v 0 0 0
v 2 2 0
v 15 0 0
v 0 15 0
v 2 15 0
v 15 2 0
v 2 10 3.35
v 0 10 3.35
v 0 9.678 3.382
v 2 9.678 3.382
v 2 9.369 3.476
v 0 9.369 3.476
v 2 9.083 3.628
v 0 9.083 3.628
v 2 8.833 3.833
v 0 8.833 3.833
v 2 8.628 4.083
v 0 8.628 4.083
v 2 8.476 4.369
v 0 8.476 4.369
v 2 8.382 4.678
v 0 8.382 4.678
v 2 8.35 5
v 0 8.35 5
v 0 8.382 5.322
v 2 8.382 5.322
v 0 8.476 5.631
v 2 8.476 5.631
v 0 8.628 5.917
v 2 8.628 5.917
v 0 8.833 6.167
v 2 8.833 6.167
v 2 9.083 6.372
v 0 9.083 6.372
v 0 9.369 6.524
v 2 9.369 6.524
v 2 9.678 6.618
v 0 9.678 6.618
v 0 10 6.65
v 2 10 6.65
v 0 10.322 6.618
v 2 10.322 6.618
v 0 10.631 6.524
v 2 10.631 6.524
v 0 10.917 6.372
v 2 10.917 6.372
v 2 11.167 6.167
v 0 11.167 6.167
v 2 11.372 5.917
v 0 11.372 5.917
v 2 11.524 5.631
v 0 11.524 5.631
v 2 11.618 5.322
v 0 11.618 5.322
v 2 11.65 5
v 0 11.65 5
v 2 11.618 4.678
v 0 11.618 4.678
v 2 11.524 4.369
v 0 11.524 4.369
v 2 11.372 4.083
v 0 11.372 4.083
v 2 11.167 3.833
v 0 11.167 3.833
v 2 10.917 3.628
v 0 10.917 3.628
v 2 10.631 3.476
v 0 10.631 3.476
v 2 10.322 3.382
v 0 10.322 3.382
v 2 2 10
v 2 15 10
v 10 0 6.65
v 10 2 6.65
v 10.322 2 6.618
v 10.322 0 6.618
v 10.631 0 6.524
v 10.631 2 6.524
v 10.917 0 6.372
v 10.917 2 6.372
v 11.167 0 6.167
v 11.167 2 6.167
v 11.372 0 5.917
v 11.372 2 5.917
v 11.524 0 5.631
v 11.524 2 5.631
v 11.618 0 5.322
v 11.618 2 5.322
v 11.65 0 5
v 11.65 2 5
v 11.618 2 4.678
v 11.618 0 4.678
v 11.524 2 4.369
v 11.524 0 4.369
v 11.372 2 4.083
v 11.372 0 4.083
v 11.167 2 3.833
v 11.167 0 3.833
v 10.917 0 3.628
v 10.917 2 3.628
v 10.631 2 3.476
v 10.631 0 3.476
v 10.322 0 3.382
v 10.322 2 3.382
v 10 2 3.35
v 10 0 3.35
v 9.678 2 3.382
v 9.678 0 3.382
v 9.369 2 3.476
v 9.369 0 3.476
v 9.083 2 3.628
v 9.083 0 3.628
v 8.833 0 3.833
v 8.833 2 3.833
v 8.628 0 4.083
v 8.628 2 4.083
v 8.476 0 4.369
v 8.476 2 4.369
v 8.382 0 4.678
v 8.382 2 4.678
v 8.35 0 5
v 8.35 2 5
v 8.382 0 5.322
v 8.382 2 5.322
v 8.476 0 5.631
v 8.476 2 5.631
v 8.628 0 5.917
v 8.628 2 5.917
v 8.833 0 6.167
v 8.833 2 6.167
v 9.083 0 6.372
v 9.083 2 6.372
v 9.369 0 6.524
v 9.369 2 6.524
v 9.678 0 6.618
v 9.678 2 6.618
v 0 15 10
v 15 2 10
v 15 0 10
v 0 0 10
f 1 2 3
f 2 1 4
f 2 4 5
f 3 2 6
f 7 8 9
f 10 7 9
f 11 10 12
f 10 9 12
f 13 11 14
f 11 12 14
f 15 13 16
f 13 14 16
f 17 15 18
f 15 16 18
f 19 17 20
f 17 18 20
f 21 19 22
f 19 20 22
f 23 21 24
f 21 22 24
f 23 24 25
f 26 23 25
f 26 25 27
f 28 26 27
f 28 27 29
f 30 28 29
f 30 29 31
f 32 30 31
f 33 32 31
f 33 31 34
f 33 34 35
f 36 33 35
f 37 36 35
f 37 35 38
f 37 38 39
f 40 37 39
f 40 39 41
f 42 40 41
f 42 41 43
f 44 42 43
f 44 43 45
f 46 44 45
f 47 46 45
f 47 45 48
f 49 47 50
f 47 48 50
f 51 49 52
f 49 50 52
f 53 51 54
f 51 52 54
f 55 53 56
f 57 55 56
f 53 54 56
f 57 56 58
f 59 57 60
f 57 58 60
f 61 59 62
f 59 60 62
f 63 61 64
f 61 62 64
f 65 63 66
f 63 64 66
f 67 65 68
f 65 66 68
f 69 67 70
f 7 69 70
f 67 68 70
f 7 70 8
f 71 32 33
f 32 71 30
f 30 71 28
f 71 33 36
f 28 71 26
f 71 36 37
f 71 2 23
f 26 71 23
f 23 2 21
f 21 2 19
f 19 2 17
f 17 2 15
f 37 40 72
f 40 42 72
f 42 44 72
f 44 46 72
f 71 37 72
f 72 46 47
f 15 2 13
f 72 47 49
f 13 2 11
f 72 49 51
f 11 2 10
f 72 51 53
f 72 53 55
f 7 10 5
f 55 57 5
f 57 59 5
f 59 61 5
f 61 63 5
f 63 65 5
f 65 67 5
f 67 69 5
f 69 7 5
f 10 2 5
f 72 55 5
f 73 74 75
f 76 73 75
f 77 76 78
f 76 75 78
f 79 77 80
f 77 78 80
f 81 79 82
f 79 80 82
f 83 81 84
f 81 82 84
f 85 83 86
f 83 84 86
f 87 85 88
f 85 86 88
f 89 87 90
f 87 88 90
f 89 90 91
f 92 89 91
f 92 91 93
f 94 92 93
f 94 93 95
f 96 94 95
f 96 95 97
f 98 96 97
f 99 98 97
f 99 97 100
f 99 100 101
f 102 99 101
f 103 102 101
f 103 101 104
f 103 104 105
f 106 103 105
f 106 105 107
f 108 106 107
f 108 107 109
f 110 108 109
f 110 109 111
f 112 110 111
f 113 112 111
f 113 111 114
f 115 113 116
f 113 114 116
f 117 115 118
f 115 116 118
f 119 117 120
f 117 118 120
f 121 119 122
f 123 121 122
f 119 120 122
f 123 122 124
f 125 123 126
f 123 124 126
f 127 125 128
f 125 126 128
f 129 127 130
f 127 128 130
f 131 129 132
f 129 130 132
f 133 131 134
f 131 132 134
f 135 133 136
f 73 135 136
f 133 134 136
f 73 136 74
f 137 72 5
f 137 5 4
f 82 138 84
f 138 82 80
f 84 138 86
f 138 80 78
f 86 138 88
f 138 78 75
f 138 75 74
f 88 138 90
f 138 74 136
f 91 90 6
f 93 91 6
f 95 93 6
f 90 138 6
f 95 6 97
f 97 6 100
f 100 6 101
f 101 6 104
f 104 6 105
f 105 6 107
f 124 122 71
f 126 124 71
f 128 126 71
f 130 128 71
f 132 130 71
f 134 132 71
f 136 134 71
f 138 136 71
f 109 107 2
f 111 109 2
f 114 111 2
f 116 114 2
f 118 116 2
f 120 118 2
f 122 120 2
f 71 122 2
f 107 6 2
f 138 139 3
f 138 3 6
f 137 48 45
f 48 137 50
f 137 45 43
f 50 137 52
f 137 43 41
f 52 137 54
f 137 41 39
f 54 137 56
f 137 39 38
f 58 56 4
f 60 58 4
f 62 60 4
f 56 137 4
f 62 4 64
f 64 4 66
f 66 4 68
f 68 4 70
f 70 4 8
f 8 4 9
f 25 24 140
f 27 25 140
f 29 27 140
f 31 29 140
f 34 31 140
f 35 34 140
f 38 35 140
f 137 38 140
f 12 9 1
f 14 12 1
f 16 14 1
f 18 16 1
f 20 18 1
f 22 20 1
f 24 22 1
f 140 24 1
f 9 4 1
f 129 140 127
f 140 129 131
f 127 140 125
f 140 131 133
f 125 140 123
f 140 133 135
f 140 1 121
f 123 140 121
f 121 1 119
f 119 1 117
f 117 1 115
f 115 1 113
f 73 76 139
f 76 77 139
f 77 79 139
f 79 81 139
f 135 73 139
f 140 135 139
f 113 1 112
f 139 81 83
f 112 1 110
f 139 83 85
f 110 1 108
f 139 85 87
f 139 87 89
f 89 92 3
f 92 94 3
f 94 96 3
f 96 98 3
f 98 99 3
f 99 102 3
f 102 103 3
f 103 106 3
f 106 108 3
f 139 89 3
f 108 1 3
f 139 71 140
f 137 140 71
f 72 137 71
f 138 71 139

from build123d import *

# Parameters (mm, degrees)
RESSALTO_EXTRUS_O2_DEPTH                   = 10
BROCA_DE_ROSQUEAR_PARA_TARRAXA_DE_M4X0_7_D = 3.3
BROCA_DE_ROSQUEAR_PARA_TARRAXA_DE_M4_2_D   = 3.3


with BuildPart() as part:
    # Esboço1 → Ressalto-extrusão2 (new body)
    with BuildSketch(Plane.XY):
        Polygon((0, 0), (15, 0), (15, 2), (2, 2), (2, 15), (0, 15), align=None)
    extrude(amount=RESSALTO_EXTRUS_O2_DEPTH)

    # Broca de rosquear para tarraxa de M4x0.7 (through all)
    with Locations(Plane(origin=(2, 10, 5), x_dir=(0, 0, 1), z_dir=(1, 0, 0))):
        with Locations((0, 0)):
            Hole(BROCA_DE_ROSQUEAR_PARA_TARRAXA_DE_M4X0_7_D / 2)

    # Broca de rosquear para tarraxa de M4 2 (through all)
    with Locations(Plane(origin=(10, 0, 5), x_dir=(0, 0, -1), z_dir=(0, -1, 0))):
        with Locations((0, 0)):
            Hole(BROCA_DE_ROSQUEAR_PARA_TARRAXA_DE_M4_2_D / 2)


solid = part.part
